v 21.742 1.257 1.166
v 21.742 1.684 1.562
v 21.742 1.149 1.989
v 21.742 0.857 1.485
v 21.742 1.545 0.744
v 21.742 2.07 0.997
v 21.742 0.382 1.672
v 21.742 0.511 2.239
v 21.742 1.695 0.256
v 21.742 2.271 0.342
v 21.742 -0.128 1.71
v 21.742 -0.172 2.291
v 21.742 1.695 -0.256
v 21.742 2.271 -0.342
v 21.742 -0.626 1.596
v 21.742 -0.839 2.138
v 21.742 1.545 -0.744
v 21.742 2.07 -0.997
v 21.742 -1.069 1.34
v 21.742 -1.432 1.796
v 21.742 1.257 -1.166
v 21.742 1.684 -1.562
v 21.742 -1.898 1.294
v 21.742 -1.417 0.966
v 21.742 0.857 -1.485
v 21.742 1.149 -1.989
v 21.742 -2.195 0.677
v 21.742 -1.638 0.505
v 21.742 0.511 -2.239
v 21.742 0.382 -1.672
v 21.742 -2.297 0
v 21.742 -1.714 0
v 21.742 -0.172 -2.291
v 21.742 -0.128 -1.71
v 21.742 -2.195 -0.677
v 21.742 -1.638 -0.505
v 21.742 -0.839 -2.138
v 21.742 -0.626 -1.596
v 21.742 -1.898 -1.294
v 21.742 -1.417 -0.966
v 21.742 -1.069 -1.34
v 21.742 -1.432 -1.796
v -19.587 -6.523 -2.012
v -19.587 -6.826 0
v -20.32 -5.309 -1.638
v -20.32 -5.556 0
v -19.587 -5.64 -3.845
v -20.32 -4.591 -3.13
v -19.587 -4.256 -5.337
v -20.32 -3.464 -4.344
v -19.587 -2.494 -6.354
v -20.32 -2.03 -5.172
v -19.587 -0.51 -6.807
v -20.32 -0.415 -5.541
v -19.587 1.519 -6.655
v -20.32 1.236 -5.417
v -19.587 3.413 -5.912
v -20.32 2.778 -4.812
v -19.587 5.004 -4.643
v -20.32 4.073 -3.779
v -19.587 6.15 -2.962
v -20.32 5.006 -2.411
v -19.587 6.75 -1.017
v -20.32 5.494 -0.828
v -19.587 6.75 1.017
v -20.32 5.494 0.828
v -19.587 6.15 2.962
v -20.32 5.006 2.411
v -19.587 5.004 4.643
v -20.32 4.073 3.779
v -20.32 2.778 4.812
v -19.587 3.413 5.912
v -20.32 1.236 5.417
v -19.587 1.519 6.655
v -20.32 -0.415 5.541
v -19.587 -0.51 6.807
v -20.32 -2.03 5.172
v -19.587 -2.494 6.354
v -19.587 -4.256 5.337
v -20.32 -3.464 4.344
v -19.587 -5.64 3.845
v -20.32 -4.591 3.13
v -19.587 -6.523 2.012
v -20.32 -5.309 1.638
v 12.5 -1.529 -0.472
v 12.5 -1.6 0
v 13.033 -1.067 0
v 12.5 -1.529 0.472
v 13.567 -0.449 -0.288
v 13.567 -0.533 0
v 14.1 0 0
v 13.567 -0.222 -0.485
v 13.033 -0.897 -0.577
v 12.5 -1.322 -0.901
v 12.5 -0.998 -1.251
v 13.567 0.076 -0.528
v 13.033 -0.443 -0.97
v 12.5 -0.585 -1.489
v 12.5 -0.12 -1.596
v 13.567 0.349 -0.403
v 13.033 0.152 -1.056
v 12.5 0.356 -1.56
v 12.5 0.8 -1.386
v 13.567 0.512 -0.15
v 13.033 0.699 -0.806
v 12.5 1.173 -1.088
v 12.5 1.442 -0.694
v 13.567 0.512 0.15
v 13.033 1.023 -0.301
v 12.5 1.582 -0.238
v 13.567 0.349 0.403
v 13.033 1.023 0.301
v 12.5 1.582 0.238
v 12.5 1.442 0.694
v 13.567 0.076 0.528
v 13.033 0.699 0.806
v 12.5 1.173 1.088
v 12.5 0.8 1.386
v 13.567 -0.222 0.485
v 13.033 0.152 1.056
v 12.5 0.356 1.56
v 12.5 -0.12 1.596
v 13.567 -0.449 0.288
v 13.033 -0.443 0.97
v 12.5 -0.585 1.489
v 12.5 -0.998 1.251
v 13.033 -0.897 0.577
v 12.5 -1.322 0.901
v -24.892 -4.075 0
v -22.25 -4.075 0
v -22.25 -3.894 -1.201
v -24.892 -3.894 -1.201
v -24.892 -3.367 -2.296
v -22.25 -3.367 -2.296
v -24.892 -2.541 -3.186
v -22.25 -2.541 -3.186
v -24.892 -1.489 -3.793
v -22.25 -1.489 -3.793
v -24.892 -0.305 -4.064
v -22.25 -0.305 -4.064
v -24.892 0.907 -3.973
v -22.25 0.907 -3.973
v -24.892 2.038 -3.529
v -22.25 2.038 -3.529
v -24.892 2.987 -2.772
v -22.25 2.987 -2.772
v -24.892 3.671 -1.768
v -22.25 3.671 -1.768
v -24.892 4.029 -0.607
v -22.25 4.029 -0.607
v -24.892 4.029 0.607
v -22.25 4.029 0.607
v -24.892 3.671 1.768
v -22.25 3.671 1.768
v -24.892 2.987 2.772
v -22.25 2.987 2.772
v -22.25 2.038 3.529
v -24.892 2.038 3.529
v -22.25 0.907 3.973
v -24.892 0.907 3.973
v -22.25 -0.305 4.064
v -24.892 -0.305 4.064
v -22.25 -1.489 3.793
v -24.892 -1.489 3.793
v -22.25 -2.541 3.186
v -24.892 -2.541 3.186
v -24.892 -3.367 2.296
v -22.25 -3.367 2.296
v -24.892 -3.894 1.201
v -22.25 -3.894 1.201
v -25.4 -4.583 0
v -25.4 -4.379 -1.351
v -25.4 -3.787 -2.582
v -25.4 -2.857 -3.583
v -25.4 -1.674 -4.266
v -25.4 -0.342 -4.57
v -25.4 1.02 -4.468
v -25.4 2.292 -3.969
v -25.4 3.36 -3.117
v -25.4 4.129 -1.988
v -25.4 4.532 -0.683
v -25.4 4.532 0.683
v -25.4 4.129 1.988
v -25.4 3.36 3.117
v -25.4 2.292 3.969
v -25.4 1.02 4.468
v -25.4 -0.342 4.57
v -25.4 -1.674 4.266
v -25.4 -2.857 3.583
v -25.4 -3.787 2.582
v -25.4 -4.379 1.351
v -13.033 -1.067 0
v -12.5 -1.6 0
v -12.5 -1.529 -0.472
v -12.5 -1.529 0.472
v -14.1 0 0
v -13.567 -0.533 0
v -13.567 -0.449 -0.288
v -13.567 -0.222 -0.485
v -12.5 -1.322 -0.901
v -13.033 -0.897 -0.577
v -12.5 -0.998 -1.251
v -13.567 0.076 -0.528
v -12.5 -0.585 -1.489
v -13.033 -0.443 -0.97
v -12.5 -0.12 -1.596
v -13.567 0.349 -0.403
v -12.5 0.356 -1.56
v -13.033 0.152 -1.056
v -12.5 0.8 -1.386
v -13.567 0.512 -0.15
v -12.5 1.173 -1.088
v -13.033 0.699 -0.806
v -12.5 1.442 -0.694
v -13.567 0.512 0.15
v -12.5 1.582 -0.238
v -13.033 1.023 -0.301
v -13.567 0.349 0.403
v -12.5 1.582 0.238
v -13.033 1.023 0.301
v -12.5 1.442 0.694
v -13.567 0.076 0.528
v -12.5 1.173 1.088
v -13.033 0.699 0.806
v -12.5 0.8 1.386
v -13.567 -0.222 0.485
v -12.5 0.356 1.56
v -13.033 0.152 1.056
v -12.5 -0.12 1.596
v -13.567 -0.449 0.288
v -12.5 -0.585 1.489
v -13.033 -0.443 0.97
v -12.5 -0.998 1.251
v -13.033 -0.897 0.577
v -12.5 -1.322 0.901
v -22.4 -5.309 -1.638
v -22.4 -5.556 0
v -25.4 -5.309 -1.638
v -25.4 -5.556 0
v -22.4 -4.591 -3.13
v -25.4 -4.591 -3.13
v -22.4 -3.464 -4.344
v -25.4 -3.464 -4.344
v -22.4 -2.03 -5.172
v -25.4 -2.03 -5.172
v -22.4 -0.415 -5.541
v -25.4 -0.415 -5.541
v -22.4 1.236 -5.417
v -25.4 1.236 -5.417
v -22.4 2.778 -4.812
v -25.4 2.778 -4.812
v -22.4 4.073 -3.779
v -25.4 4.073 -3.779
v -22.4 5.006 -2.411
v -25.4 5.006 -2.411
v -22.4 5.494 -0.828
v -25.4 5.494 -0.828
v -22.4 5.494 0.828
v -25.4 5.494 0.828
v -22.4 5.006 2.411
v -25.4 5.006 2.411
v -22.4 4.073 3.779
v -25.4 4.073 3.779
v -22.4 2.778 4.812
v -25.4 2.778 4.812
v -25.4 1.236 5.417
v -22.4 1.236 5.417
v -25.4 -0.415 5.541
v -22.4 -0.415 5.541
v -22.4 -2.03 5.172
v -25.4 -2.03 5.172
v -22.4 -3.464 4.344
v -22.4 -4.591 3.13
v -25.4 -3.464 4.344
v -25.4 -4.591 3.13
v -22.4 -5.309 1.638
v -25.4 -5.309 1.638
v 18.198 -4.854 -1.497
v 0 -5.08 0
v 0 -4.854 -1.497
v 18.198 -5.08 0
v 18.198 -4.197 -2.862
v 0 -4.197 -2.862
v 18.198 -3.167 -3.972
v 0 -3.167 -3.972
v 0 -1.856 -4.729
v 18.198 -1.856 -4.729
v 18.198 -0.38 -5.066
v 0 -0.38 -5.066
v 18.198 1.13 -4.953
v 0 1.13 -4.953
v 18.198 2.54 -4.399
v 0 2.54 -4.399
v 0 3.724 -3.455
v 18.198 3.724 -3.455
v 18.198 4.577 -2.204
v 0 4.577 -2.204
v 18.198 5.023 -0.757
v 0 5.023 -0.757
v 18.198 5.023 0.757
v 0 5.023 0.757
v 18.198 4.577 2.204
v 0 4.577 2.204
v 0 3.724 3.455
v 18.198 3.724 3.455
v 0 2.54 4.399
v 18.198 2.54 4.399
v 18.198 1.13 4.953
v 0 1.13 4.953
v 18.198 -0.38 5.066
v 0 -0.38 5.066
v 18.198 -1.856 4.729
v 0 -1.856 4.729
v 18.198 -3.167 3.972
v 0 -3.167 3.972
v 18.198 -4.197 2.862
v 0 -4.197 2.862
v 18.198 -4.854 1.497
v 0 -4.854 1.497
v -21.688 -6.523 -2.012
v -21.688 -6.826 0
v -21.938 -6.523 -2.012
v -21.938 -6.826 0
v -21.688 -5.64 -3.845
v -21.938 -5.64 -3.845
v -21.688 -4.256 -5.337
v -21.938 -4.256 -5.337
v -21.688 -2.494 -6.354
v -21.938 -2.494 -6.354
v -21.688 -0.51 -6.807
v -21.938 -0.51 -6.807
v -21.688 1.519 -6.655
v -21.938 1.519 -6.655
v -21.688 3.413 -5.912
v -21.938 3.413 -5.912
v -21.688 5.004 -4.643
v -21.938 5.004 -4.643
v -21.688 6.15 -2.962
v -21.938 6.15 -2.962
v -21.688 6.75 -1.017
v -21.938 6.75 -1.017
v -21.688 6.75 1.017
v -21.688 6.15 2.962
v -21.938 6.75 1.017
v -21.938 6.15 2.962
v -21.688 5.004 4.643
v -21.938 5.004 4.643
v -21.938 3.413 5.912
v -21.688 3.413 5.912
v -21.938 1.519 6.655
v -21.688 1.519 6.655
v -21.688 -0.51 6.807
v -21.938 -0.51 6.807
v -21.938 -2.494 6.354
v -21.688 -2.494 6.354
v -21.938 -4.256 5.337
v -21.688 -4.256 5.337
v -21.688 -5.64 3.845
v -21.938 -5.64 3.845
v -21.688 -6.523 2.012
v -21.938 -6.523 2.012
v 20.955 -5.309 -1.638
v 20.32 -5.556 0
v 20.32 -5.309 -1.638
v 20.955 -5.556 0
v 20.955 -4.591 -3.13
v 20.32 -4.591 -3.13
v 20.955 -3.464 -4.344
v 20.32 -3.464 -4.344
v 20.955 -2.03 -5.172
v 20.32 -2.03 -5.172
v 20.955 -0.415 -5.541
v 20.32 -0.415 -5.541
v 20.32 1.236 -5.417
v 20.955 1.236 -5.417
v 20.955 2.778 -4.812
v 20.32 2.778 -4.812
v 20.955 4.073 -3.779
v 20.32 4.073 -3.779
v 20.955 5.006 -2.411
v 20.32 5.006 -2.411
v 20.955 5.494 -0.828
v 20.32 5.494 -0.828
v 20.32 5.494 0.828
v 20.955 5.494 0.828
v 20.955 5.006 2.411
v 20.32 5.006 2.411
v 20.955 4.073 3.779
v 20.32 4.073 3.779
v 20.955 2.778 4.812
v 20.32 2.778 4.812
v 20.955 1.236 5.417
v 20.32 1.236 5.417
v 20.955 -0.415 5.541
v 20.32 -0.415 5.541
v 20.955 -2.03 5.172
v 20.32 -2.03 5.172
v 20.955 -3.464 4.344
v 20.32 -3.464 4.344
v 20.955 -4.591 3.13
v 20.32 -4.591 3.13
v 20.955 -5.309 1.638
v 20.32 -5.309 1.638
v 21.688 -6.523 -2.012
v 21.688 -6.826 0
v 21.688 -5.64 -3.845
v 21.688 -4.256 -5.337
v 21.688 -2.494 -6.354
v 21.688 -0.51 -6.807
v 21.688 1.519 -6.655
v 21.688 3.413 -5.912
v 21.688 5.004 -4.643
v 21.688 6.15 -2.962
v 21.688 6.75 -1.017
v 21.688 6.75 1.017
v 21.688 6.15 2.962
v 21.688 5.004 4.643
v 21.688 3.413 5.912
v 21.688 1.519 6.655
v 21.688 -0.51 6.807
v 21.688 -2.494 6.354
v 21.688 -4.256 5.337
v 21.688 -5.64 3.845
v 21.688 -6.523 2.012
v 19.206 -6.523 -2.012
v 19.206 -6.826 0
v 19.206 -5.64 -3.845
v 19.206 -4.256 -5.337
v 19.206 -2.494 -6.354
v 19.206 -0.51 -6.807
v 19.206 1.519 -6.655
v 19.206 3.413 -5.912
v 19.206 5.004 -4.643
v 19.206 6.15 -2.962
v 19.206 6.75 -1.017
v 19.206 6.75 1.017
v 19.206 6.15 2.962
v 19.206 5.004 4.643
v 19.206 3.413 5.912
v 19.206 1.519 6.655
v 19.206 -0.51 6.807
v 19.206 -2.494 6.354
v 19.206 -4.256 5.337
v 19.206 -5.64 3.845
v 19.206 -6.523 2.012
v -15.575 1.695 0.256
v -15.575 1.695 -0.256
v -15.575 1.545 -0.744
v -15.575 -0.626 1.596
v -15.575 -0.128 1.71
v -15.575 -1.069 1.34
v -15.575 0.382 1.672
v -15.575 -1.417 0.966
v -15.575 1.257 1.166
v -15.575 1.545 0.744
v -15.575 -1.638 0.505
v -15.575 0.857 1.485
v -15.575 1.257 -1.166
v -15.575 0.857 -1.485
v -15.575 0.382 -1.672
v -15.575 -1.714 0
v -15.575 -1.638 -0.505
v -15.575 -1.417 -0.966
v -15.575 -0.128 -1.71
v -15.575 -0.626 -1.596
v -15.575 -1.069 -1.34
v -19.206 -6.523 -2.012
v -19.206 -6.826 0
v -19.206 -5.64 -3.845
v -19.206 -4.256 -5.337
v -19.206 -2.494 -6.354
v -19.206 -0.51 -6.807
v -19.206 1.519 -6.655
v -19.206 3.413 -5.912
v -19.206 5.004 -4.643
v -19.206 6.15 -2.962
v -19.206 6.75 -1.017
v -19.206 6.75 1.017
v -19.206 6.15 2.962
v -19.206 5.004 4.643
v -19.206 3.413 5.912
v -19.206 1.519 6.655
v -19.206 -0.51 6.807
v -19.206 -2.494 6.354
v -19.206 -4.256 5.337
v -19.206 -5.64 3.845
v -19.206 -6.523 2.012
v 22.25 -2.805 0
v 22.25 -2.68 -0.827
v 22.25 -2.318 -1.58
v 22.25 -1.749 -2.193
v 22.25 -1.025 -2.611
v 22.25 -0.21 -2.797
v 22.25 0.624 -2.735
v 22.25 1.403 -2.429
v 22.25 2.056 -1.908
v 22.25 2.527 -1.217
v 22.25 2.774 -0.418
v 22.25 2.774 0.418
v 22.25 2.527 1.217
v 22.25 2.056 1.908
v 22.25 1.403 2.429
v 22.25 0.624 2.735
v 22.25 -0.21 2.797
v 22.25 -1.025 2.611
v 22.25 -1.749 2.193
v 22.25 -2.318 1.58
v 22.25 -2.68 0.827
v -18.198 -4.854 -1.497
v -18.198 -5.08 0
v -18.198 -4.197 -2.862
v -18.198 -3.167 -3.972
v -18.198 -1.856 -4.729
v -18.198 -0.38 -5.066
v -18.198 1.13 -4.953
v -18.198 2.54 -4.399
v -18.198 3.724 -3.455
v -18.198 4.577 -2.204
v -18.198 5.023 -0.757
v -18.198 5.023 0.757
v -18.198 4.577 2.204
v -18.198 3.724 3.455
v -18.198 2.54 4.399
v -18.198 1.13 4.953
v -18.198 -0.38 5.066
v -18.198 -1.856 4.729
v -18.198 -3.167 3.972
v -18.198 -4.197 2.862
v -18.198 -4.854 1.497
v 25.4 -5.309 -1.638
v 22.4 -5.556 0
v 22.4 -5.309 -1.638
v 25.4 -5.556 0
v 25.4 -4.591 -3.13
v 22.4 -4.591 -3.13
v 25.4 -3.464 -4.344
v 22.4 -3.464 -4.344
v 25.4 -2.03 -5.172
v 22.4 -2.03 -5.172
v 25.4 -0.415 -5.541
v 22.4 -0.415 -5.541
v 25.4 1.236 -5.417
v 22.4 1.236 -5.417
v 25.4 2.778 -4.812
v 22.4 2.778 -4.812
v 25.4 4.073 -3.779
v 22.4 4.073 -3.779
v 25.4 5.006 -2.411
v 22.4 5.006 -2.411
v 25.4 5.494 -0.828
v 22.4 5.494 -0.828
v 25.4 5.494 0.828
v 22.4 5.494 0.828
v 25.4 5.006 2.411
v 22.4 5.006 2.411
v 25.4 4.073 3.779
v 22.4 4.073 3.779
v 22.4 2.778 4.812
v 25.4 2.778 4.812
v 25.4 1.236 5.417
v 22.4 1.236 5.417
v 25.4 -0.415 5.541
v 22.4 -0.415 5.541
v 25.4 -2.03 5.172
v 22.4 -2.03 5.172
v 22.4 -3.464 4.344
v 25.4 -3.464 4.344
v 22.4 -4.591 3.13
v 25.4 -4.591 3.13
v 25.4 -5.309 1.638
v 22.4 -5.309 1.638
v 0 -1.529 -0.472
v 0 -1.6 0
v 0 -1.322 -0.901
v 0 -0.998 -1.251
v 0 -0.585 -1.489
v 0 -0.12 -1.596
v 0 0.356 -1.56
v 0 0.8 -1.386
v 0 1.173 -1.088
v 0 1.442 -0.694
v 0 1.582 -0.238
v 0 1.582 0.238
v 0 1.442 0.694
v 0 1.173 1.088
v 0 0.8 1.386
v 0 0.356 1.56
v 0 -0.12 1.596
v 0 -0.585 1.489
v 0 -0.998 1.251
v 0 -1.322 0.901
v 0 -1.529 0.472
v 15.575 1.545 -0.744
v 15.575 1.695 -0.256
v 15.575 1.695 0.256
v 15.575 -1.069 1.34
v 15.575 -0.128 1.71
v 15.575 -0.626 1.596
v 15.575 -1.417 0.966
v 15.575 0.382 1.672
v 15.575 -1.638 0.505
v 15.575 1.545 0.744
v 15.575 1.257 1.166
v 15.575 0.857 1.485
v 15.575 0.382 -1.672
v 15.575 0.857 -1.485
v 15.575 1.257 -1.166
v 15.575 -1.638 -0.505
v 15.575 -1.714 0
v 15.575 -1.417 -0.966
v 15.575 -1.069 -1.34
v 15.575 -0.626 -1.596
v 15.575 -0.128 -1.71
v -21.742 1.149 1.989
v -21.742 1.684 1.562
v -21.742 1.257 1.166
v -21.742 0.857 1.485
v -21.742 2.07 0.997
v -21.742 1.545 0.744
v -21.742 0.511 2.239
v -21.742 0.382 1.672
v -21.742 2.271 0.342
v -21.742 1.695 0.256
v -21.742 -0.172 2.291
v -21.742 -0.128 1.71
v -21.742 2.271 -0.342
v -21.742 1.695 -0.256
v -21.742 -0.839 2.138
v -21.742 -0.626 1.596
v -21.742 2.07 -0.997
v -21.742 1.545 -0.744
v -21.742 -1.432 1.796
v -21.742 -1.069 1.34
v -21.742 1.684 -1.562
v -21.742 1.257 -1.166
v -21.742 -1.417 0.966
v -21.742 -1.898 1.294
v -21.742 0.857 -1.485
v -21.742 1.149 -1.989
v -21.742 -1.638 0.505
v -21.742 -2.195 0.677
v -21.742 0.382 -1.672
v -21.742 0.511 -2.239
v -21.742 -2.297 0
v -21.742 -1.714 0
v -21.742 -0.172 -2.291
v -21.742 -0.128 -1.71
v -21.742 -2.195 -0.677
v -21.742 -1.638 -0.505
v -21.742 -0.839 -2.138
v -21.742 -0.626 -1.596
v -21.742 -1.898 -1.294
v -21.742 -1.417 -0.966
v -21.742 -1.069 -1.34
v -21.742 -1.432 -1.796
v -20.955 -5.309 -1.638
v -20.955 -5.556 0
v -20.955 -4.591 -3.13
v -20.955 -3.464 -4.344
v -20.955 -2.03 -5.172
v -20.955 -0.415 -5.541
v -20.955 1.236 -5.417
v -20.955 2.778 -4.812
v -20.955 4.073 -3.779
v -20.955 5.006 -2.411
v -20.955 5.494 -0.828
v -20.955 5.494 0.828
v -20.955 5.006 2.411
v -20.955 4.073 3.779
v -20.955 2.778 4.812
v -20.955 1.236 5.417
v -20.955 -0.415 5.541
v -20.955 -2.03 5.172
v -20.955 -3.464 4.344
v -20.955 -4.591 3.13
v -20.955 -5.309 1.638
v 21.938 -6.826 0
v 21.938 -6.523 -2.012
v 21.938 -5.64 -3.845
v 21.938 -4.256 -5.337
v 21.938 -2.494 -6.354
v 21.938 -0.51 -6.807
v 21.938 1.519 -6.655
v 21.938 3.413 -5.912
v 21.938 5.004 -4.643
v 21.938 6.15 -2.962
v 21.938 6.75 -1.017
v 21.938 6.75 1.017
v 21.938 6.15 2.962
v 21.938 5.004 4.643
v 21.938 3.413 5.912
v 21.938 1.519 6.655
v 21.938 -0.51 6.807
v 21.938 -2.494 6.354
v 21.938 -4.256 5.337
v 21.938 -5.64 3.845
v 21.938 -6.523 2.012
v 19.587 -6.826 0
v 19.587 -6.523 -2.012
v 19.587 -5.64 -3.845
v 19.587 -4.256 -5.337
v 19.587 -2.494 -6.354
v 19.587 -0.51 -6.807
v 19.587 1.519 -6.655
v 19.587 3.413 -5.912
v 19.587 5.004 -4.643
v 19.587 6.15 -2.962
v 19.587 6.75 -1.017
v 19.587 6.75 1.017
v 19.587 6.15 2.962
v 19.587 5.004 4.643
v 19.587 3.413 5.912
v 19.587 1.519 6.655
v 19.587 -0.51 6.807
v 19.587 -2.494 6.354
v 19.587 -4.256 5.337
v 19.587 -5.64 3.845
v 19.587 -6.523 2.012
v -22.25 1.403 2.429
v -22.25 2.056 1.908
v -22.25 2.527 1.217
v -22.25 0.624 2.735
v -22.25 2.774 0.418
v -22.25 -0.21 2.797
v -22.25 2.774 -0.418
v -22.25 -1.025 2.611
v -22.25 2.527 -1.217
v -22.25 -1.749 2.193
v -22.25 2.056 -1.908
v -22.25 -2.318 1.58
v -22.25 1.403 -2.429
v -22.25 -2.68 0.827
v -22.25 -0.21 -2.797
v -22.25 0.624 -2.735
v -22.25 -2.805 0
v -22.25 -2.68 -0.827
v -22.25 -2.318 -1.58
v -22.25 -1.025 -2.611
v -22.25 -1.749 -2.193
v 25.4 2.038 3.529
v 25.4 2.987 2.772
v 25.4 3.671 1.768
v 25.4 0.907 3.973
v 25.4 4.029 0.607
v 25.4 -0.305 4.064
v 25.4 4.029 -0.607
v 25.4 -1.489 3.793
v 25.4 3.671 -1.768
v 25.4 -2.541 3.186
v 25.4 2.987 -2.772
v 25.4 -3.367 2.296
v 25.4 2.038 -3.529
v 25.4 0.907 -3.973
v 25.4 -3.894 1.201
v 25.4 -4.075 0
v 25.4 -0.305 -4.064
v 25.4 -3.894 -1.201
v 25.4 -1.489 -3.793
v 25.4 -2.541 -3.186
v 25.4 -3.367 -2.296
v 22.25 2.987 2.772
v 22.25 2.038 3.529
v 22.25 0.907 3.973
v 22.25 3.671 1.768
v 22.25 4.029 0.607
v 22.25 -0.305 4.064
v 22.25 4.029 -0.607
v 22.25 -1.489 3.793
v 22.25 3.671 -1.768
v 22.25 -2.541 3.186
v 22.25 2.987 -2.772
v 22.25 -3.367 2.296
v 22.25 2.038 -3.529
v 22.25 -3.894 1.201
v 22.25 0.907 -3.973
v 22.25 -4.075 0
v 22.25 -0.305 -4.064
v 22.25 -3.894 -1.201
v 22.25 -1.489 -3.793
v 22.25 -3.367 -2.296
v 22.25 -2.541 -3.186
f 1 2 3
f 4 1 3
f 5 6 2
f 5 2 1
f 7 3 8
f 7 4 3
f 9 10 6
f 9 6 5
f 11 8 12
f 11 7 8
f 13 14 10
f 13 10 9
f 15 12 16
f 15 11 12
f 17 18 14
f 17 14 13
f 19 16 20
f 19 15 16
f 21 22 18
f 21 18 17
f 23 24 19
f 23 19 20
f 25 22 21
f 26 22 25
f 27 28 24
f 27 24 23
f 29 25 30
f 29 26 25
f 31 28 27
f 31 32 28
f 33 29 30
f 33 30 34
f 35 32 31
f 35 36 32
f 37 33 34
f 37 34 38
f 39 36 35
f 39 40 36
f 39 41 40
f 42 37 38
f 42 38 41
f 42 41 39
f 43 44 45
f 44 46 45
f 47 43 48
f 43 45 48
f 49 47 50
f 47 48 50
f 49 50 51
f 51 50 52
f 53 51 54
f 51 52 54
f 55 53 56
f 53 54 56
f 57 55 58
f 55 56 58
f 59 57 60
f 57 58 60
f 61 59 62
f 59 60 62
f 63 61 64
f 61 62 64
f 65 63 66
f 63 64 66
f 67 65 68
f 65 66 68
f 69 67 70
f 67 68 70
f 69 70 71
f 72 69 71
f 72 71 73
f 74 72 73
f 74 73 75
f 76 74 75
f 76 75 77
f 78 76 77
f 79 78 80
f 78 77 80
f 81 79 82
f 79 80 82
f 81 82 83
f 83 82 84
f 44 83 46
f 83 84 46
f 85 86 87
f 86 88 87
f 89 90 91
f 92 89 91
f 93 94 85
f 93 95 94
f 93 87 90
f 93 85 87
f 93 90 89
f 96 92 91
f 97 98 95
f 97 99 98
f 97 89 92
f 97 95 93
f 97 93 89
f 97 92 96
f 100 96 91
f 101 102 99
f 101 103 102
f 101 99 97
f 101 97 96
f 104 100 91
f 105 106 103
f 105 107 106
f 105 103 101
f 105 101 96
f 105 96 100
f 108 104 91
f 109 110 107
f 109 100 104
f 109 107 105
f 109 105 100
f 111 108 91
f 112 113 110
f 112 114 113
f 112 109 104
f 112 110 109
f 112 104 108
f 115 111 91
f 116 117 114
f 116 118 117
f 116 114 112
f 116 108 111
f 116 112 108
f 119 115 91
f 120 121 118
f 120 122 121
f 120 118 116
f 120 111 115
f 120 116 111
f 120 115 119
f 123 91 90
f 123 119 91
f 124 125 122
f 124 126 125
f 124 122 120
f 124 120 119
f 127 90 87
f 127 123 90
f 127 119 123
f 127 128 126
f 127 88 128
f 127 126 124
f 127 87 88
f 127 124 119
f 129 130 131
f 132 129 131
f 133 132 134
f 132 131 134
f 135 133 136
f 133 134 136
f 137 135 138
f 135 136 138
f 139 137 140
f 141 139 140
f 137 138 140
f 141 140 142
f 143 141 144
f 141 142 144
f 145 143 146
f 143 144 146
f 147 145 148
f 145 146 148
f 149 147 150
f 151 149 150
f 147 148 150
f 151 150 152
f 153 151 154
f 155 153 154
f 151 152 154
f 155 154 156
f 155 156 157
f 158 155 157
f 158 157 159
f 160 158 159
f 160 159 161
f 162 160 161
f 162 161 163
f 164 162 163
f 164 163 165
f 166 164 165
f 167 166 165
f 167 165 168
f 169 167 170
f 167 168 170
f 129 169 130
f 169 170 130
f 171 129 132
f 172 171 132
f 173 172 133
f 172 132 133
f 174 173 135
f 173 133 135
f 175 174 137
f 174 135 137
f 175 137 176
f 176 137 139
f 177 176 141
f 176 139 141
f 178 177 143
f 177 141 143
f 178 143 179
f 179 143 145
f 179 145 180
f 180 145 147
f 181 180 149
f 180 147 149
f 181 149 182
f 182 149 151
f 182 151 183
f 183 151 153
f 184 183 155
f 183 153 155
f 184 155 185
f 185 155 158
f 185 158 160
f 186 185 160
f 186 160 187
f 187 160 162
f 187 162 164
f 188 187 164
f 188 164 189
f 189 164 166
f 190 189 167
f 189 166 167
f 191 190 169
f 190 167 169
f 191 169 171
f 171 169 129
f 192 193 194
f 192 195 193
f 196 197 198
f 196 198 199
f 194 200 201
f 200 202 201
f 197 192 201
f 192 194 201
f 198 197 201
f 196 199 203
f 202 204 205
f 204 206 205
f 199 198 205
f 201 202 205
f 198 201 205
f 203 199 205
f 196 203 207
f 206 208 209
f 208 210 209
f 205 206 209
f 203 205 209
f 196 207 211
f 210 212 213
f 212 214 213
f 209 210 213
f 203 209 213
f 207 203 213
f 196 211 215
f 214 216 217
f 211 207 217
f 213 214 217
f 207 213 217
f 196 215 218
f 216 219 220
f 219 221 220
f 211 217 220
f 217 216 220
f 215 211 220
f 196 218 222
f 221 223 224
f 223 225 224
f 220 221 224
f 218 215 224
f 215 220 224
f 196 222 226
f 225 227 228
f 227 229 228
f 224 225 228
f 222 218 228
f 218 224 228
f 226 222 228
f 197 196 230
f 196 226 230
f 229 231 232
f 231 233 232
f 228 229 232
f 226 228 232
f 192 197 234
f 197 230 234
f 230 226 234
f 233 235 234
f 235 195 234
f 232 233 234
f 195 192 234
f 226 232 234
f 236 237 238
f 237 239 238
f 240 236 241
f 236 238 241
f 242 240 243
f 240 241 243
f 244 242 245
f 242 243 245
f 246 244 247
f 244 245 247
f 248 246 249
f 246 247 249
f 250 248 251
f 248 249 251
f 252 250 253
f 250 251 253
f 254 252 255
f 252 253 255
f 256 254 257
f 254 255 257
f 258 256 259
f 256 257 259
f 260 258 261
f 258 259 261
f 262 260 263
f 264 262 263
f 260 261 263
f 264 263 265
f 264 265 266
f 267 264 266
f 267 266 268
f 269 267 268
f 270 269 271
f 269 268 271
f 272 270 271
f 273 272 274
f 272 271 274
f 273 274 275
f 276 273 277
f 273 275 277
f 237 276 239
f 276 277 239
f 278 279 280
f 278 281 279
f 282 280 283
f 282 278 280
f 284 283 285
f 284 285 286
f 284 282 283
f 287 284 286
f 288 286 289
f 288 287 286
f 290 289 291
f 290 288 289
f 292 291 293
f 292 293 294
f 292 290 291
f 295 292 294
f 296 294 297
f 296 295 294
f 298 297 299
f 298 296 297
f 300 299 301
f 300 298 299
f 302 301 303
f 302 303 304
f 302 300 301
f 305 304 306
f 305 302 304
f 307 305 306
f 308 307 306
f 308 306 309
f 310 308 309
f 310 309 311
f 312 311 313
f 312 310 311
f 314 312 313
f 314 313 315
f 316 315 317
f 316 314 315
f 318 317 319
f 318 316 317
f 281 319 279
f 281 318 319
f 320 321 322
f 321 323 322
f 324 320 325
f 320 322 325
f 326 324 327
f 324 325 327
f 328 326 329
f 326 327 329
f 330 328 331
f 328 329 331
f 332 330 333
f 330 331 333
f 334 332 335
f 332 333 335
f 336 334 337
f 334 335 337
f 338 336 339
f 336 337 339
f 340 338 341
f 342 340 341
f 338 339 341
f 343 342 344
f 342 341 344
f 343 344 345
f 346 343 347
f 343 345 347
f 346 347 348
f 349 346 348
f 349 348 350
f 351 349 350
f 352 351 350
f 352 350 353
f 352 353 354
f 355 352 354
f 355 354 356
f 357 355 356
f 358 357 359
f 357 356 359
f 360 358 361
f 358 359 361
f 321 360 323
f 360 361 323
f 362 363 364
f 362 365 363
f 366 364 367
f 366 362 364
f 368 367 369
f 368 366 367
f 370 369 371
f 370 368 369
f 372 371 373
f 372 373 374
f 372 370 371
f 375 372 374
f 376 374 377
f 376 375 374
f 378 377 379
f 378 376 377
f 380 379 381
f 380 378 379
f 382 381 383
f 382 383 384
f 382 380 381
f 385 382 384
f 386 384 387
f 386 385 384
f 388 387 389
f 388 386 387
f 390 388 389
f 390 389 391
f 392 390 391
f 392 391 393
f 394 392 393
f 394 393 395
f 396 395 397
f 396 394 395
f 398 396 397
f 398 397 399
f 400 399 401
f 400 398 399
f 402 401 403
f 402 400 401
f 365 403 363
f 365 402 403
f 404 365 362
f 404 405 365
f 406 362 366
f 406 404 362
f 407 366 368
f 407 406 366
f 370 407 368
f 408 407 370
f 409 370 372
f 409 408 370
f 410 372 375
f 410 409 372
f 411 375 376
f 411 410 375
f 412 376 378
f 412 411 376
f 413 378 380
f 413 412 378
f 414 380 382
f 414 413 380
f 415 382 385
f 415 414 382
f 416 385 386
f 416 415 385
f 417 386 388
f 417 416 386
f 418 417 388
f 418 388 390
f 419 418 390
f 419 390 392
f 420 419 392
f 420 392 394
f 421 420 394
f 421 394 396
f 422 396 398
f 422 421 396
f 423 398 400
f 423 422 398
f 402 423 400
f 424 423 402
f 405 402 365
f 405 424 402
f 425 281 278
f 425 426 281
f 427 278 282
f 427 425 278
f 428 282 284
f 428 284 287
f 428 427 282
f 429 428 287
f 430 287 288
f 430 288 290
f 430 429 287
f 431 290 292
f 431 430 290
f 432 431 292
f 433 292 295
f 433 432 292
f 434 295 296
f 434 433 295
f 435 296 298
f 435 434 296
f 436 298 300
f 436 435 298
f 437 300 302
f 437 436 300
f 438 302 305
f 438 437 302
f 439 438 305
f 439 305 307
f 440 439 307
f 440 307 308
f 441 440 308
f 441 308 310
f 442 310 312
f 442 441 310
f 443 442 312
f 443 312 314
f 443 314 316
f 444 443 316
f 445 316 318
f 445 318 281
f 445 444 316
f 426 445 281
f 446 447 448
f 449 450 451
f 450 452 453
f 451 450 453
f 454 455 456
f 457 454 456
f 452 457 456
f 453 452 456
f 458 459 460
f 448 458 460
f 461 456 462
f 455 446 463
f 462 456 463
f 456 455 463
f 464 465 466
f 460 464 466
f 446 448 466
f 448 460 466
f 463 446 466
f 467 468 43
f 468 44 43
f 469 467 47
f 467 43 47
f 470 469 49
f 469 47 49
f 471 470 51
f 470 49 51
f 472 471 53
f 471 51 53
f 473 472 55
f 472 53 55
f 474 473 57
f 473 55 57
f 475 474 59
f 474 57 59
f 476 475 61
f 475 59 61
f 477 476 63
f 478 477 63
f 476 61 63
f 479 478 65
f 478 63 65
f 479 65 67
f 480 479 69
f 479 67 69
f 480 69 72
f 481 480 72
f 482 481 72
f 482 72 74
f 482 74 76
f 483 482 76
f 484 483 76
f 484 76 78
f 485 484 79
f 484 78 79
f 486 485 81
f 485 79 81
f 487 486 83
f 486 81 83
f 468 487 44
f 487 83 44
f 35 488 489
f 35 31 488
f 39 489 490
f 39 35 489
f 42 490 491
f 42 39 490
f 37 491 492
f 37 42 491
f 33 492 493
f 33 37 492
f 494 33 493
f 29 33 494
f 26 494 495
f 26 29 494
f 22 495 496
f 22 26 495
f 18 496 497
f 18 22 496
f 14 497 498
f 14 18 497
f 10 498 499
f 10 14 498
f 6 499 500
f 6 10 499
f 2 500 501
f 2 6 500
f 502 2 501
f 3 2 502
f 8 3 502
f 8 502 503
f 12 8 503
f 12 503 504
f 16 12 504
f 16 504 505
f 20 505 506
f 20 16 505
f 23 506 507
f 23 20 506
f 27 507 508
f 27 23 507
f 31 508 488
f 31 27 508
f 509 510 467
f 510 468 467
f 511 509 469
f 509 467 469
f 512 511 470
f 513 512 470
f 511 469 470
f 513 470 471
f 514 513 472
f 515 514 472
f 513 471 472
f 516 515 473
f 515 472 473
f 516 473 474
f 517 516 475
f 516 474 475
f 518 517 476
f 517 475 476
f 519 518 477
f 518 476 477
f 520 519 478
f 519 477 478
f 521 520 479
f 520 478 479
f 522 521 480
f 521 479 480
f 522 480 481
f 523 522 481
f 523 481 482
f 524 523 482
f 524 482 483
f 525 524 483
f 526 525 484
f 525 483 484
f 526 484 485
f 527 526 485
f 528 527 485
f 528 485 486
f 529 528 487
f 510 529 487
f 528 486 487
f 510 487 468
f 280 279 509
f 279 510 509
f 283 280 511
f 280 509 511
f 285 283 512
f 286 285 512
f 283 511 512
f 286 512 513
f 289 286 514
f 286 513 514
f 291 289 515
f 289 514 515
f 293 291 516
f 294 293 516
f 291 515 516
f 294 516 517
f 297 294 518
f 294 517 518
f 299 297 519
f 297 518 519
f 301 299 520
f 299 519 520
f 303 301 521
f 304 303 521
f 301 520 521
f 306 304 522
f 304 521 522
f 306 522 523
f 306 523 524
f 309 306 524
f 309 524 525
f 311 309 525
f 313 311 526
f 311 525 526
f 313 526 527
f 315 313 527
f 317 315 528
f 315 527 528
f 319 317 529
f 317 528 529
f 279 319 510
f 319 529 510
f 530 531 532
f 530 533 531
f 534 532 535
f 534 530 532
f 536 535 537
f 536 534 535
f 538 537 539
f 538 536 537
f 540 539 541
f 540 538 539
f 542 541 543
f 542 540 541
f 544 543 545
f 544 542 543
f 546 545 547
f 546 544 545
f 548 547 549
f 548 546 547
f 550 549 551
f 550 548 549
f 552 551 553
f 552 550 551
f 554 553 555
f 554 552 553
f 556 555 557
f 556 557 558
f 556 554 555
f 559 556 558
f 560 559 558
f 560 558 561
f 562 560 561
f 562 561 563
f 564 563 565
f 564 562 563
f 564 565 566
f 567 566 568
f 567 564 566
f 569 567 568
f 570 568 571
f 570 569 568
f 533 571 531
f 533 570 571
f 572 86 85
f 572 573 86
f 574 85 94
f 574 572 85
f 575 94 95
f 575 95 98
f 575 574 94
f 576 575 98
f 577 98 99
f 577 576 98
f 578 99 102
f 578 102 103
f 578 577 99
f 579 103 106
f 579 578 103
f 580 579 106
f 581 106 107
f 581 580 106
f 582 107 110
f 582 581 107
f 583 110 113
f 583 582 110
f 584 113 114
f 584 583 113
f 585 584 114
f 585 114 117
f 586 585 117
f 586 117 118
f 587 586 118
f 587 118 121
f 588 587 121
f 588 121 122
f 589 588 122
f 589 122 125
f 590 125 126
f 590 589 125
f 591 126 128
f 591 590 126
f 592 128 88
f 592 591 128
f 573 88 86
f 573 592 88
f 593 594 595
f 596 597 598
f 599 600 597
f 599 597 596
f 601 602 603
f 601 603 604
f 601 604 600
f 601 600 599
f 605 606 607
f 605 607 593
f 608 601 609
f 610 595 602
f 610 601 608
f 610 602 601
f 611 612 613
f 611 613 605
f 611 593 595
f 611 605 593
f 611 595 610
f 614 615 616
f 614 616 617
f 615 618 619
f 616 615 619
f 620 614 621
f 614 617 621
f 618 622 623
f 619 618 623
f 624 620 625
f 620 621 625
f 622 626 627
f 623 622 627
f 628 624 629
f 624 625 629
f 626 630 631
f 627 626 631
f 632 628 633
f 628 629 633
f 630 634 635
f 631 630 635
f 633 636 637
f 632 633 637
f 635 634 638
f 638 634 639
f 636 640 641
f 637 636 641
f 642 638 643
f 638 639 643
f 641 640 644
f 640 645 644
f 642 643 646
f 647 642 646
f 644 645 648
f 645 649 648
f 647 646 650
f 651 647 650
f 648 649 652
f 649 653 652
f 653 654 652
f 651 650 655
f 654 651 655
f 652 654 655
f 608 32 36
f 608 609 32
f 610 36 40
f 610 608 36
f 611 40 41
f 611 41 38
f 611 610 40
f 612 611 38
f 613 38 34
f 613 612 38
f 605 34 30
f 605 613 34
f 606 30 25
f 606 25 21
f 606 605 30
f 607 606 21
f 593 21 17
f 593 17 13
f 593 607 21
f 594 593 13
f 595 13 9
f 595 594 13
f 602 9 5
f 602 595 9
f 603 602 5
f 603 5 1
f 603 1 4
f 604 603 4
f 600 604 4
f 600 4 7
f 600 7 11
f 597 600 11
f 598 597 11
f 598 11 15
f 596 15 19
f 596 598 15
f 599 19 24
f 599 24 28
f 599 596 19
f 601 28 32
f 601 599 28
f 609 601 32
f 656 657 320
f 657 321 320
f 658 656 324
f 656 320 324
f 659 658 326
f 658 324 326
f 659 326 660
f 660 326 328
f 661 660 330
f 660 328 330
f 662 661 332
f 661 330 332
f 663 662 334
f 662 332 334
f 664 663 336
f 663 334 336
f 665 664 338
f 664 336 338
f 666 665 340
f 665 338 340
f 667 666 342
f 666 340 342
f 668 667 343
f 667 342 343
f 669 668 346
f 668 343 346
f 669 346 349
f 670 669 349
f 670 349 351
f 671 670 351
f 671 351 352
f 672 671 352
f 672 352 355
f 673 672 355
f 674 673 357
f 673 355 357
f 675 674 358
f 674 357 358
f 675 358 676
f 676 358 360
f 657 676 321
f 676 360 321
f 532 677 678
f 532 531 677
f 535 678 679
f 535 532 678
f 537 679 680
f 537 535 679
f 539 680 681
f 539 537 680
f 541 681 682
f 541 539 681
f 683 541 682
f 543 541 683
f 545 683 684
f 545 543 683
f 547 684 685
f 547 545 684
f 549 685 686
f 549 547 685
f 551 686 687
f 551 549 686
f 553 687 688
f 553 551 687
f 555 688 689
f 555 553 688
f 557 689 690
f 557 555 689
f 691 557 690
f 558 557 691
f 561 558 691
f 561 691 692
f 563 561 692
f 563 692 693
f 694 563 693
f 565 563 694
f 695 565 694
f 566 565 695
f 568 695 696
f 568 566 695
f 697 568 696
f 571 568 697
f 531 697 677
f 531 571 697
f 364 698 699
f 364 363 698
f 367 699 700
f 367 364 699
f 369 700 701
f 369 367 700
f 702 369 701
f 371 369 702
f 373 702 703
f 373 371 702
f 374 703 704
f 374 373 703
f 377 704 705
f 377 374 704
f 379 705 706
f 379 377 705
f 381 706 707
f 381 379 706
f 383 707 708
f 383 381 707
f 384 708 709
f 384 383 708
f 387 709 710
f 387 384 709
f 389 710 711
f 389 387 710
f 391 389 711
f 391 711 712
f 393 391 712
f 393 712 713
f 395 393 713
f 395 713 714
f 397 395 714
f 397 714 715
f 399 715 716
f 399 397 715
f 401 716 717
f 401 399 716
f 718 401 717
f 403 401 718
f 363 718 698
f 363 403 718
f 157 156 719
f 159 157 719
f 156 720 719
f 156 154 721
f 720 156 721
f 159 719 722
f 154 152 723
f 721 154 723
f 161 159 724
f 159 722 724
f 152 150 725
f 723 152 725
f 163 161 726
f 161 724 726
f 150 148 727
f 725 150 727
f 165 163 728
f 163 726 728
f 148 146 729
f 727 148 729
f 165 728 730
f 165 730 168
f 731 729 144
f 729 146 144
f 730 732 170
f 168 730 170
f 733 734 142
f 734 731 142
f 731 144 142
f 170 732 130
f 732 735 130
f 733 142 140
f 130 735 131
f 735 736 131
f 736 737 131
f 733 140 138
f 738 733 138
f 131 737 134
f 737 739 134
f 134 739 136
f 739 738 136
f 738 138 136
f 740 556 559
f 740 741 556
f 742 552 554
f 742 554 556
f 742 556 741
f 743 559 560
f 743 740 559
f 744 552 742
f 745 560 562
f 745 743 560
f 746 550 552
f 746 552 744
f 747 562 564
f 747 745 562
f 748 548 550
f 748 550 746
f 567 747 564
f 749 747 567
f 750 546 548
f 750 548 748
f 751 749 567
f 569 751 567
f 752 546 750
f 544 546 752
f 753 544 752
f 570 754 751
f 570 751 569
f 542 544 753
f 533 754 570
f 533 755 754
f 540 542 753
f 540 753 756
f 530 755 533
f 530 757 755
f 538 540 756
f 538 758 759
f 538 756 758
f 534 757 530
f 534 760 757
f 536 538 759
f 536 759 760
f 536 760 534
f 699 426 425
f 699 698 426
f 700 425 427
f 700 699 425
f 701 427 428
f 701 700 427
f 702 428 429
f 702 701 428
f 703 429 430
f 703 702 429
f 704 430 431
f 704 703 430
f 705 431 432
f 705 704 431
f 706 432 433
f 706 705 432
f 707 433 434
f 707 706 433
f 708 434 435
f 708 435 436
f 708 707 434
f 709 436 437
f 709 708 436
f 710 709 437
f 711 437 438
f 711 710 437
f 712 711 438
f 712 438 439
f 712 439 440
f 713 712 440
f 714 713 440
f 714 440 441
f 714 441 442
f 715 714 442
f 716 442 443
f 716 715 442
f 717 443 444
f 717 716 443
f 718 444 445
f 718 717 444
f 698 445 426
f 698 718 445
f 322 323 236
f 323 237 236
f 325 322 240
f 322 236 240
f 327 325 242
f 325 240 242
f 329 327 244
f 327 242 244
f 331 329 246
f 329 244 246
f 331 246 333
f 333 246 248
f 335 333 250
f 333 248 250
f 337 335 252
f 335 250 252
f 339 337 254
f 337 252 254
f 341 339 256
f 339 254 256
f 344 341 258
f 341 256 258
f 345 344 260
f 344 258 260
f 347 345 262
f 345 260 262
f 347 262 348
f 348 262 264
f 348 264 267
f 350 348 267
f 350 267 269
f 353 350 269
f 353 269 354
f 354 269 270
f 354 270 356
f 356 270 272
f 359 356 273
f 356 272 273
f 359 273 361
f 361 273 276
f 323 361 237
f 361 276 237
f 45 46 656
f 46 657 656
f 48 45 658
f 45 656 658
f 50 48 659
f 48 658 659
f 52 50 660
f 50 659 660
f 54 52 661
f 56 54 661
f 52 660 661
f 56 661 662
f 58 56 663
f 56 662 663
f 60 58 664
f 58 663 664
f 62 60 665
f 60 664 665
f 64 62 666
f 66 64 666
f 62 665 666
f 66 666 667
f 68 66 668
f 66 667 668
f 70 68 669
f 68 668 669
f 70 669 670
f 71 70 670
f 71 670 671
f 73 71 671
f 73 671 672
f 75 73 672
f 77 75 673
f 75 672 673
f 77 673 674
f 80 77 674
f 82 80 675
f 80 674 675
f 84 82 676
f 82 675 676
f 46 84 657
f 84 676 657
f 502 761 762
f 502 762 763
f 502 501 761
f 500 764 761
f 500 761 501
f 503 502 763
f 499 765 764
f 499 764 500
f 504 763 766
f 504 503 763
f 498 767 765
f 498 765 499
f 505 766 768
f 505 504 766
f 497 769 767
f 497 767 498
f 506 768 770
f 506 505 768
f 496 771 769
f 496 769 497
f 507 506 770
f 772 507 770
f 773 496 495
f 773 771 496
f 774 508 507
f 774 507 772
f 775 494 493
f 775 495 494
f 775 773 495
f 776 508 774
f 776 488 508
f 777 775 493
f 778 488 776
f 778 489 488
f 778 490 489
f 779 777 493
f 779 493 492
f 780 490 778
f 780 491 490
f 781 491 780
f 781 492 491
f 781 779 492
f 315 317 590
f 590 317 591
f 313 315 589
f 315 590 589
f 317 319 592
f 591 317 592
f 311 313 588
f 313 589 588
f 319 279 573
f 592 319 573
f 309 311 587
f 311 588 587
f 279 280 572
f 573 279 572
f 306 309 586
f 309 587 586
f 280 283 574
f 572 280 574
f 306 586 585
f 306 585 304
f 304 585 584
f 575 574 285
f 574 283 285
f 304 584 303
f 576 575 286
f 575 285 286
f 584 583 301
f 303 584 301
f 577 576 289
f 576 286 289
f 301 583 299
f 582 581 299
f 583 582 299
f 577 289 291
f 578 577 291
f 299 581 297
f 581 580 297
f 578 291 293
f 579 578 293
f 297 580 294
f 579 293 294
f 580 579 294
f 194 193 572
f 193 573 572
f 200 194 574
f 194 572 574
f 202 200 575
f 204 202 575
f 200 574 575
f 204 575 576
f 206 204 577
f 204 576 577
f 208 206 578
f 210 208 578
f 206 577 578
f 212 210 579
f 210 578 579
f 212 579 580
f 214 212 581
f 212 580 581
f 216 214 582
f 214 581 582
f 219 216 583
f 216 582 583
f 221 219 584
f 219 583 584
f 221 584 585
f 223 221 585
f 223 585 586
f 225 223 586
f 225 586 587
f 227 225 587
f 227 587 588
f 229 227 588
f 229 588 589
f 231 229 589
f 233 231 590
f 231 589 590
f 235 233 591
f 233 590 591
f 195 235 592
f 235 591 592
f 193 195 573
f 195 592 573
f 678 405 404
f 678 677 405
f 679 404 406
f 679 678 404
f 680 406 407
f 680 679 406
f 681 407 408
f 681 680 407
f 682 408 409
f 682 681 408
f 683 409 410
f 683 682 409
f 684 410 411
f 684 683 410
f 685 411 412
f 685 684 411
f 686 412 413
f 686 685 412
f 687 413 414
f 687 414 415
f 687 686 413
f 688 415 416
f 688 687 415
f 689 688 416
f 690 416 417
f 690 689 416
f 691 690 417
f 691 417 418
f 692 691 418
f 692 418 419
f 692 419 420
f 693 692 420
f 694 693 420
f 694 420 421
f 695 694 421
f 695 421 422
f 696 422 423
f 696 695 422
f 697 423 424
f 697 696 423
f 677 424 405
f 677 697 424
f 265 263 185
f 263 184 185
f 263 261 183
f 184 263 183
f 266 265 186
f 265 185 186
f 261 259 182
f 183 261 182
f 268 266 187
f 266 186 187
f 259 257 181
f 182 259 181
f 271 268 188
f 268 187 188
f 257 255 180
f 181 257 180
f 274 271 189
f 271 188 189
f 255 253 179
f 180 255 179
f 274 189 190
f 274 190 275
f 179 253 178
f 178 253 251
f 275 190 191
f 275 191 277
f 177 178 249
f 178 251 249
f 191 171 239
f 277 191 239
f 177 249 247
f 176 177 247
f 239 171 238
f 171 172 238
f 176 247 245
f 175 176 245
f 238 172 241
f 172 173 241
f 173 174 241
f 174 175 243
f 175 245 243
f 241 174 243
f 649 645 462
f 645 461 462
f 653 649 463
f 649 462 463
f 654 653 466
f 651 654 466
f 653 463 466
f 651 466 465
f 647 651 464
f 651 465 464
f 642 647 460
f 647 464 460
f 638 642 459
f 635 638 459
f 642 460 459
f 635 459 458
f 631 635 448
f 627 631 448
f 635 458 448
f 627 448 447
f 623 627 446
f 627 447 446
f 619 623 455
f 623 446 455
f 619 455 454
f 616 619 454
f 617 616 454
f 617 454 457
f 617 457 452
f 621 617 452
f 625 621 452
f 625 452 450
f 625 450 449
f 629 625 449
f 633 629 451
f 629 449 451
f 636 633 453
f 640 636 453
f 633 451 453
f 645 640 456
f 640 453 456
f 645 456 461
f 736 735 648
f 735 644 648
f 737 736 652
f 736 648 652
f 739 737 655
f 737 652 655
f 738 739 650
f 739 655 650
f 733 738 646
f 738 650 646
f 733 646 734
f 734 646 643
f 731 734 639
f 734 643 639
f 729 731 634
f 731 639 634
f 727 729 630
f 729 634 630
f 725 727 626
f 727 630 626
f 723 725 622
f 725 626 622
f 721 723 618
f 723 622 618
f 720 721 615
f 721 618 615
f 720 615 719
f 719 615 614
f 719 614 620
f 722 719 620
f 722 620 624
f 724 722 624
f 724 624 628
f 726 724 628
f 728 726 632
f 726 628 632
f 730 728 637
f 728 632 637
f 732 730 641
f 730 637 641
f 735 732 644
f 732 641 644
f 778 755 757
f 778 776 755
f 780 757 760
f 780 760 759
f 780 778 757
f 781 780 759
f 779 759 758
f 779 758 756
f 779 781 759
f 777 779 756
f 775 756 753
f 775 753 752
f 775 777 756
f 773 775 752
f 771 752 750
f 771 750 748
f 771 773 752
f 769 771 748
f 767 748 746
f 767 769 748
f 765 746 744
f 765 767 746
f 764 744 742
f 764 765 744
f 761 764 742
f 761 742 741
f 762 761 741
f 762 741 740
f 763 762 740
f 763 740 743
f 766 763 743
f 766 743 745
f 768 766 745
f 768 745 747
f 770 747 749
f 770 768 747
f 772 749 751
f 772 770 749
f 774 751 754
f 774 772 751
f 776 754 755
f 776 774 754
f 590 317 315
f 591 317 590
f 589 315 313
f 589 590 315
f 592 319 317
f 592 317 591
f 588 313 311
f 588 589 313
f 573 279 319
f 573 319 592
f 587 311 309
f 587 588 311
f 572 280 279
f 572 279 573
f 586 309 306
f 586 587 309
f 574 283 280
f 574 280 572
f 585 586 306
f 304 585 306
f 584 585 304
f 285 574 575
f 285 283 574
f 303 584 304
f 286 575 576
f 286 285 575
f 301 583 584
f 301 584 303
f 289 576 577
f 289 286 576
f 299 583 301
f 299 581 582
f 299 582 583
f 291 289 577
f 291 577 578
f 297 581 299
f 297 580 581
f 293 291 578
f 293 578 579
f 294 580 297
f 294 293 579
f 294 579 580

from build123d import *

# Parameters (mm, degrees)
CHAMFER1_SIZE = 0.508


with BuildPart() as part:
    # Sketch2 → Revolve1 (revolve)
    with BuildSketch(Plane.XY, mode=Mode.PRIVATE) as revolve1_sk:
        Polygon((-22.4, 5.55625), (-25.4, 5.55625), (-25.4, 4.075), (-22.25, 4.075), (-22.25, 2.805), (-21.742, 2.297), (-21.742, 1.7145), (-15.575, 1.7145), (-15.575, 0), (-14.1, 0), (-12.5, 1.6), (0, 1.6), (0, 5.08), (-18.197567251, 5.08), (-19.205765158, 6.82625), (-19.586765158, 6.82625), (-20.32, 5.55625), (-20.955, 5.55625), (-21.688234842, 6.82625), (-21.937757802, 6.82625), align=None)
    revolve(revolve1_sk.sketch.rotate(Axis((-25.4, 0, 0), (1, 0, 0)), 180), axis=Axis((-25.4, 0, 0), (1, 0, 0)))


with BuildPart() as body_2:
    # Mirror1: mirrored copy
    add(part.part.mirror(Plane(origin=(0, 0, 0), x_dir=(0, 0, 1), z_dir=(1, 0, 0))))


with BuildPart() as part_1:
    add(part.part)

    # Chamfer1
    chamfer1_edges = [part_1.edges().sort_by_distance(p)[0] for p in [
        (-25.4, 4.075, 0),
    ]]
    chamfer(chamfer1_edges, length=CHAMFER1_SIZE)


solid = Compound([body_2.part, part_1.part])
